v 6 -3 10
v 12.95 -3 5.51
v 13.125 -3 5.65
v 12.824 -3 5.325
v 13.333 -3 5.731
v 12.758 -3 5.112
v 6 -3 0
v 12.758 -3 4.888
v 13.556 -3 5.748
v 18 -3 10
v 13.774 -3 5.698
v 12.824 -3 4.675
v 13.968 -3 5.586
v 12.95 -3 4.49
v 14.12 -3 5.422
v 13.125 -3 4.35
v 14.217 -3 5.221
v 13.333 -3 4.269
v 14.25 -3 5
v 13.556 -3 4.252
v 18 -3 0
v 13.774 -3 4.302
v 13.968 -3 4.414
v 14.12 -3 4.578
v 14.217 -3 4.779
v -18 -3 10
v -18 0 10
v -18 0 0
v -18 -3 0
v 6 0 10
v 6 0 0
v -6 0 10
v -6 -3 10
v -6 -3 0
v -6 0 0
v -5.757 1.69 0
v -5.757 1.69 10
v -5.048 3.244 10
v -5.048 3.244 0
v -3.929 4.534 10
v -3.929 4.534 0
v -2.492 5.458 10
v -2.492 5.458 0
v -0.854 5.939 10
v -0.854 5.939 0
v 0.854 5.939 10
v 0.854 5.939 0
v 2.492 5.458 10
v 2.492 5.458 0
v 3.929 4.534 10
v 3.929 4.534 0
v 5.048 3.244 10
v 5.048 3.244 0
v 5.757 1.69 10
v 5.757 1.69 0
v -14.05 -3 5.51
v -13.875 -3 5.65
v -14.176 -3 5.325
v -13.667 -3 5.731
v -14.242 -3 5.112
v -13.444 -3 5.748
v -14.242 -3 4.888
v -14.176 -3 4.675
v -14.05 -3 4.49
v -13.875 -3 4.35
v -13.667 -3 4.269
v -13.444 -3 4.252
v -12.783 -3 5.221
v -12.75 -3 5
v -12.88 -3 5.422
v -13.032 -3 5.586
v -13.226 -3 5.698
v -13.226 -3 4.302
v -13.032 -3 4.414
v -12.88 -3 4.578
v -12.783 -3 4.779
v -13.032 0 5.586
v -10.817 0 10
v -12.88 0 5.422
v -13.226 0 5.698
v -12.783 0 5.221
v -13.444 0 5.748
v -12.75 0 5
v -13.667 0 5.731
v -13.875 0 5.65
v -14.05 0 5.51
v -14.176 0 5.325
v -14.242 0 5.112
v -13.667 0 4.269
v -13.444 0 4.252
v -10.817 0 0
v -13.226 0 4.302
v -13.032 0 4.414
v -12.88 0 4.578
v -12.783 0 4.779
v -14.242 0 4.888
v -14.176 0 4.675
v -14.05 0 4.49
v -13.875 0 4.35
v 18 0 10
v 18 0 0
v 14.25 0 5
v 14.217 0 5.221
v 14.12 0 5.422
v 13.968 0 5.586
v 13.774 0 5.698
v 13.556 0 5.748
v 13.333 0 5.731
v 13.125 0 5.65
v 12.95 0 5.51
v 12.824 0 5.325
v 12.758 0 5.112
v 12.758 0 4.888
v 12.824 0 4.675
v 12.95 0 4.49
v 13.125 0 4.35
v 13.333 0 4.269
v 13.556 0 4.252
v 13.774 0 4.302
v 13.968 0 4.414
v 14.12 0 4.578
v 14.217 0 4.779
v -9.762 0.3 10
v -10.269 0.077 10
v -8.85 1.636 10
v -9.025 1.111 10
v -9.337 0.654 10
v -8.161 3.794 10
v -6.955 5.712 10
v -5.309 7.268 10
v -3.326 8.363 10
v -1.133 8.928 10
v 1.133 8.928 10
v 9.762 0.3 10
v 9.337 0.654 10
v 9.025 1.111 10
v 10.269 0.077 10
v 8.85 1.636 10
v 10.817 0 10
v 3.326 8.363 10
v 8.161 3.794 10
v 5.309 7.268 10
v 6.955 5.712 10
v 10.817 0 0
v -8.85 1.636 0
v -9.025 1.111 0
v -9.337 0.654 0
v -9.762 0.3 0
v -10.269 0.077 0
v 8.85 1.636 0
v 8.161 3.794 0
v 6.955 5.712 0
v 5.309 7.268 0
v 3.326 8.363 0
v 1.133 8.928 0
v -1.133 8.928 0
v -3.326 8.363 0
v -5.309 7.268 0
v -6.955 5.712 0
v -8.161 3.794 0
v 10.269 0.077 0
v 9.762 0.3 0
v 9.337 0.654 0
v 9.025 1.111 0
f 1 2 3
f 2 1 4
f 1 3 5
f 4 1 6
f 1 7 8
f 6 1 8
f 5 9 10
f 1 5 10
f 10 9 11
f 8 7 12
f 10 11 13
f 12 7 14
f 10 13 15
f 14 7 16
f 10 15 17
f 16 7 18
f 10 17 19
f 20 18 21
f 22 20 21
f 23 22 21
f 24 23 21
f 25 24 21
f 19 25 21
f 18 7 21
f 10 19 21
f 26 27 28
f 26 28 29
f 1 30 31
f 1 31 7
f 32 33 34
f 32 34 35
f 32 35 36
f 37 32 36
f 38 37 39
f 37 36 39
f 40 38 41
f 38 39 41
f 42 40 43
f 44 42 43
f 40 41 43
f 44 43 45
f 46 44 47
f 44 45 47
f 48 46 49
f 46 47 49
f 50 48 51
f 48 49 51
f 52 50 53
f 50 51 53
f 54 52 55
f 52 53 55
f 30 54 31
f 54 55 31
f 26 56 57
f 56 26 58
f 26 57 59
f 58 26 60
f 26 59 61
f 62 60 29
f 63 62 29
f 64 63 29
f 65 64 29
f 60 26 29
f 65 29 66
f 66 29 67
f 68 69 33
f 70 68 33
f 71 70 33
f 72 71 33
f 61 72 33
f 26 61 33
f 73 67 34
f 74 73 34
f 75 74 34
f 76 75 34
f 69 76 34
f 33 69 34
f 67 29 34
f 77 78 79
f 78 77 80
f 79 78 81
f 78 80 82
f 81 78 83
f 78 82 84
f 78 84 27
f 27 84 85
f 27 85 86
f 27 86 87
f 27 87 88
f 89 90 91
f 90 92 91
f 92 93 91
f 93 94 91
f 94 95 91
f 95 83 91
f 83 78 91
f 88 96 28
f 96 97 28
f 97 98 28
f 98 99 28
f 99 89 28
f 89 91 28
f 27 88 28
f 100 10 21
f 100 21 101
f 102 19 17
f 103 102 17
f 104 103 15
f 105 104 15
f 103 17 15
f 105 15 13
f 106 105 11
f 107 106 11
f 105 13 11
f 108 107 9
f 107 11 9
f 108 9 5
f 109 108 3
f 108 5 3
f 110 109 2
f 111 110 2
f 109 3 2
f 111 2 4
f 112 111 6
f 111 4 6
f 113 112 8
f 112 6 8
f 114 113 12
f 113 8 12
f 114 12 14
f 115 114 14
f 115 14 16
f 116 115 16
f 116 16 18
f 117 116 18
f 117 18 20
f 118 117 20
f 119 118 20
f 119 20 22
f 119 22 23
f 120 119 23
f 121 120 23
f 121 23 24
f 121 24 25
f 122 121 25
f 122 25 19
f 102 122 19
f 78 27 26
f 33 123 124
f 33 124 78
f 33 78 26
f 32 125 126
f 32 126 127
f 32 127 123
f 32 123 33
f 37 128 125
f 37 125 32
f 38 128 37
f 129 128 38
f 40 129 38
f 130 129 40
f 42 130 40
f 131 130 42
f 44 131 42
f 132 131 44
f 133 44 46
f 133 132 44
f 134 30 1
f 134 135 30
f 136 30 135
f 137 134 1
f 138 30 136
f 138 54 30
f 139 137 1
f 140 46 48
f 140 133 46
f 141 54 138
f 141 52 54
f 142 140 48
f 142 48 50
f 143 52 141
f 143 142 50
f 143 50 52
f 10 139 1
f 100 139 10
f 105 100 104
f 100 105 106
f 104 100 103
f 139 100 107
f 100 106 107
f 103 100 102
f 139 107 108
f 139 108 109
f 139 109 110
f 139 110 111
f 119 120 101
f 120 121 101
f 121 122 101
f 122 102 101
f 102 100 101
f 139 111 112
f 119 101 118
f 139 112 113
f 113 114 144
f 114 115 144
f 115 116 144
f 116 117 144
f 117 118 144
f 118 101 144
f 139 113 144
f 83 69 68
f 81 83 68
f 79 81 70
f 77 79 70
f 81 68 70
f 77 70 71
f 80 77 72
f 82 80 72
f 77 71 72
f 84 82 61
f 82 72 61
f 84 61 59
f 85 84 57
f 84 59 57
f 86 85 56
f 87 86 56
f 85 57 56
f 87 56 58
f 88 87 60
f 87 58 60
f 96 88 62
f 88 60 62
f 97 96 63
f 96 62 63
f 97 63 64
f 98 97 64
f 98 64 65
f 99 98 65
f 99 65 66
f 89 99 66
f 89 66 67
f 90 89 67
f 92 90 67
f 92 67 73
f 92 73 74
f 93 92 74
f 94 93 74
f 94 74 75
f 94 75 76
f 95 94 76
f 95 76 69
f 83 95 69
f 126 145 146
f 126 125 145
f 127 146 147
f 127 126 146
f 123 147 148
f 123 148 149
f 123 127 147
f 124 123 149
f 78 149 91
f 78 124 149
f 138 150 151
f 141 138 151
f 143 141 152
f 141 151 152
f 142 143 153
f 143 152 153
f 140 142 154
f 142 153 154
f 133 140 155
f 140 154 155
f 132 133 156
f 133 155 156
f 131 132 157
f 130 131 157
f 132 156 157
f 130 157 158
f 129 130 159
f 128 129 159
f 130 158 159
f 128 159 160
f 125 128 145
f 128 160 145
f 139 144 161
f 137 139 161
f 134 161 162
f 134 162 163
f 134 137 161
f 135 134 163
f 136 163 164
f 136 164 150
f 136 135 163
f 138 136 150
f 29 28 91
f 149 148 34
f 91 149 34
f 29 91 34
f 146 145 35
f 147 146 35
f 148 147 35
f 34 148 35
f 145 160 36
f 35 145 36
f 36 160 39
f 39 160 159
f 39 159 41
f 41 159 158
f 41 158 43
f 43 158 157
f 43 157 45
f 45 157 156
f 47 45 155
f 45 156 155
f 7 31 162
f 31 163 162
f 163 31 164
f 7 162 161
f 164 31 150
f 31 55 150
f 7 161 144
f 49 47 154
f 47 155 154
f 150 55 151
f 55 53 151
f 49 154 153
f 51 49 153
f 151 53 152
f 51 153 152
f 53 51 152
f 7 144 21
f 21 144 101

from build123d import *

# Parameters (mm, degrees)
F1_DEPTH = 10
F3_D     = 1.5
F4_R     = 2


with BuildPart() as f1:
    # F0 (on Top) → F1 (new body)
    with BuildSketch(Plane.XY):
        with BuildLine():
            ThreePointArc((-6, 0), (0, 6), (6, 0))
            Line((6, 0), (6, -3))
            Line((6, -3), (18, -3))
            Line((18, -3), (18, 0))
            Line((18, 0), (9, 0))
            ThreePointArc((9, 0), (0, 9), (-9, 0))
            Line((-9, 0), (-18, 0))
            Line((-18, 0), (-18, -3))
            Line((-18, -3), (-6, -3))
            Line((-6, -3), (-6, 0))
        make_face()
    extrude(amount=F1_DEPTH)

    # F3 (through all)
    with Locations(Plane(origin=(0, 0, 0), x_dir=(-1, 0, 0), z_dir=(0, 1, 0))):
        with Locations((-13.5, 5), (13.5, 5)):
            Hole(F3_D / 2)

    # F4
    f4_edges = [f1.edges().sort_by_distance(p)[0] for p in [
        (9, 0, 5),
        (-9, 0, 5),
    ]]
    fillet(f4_edges, radius=F4_R)


solid = f1.part
